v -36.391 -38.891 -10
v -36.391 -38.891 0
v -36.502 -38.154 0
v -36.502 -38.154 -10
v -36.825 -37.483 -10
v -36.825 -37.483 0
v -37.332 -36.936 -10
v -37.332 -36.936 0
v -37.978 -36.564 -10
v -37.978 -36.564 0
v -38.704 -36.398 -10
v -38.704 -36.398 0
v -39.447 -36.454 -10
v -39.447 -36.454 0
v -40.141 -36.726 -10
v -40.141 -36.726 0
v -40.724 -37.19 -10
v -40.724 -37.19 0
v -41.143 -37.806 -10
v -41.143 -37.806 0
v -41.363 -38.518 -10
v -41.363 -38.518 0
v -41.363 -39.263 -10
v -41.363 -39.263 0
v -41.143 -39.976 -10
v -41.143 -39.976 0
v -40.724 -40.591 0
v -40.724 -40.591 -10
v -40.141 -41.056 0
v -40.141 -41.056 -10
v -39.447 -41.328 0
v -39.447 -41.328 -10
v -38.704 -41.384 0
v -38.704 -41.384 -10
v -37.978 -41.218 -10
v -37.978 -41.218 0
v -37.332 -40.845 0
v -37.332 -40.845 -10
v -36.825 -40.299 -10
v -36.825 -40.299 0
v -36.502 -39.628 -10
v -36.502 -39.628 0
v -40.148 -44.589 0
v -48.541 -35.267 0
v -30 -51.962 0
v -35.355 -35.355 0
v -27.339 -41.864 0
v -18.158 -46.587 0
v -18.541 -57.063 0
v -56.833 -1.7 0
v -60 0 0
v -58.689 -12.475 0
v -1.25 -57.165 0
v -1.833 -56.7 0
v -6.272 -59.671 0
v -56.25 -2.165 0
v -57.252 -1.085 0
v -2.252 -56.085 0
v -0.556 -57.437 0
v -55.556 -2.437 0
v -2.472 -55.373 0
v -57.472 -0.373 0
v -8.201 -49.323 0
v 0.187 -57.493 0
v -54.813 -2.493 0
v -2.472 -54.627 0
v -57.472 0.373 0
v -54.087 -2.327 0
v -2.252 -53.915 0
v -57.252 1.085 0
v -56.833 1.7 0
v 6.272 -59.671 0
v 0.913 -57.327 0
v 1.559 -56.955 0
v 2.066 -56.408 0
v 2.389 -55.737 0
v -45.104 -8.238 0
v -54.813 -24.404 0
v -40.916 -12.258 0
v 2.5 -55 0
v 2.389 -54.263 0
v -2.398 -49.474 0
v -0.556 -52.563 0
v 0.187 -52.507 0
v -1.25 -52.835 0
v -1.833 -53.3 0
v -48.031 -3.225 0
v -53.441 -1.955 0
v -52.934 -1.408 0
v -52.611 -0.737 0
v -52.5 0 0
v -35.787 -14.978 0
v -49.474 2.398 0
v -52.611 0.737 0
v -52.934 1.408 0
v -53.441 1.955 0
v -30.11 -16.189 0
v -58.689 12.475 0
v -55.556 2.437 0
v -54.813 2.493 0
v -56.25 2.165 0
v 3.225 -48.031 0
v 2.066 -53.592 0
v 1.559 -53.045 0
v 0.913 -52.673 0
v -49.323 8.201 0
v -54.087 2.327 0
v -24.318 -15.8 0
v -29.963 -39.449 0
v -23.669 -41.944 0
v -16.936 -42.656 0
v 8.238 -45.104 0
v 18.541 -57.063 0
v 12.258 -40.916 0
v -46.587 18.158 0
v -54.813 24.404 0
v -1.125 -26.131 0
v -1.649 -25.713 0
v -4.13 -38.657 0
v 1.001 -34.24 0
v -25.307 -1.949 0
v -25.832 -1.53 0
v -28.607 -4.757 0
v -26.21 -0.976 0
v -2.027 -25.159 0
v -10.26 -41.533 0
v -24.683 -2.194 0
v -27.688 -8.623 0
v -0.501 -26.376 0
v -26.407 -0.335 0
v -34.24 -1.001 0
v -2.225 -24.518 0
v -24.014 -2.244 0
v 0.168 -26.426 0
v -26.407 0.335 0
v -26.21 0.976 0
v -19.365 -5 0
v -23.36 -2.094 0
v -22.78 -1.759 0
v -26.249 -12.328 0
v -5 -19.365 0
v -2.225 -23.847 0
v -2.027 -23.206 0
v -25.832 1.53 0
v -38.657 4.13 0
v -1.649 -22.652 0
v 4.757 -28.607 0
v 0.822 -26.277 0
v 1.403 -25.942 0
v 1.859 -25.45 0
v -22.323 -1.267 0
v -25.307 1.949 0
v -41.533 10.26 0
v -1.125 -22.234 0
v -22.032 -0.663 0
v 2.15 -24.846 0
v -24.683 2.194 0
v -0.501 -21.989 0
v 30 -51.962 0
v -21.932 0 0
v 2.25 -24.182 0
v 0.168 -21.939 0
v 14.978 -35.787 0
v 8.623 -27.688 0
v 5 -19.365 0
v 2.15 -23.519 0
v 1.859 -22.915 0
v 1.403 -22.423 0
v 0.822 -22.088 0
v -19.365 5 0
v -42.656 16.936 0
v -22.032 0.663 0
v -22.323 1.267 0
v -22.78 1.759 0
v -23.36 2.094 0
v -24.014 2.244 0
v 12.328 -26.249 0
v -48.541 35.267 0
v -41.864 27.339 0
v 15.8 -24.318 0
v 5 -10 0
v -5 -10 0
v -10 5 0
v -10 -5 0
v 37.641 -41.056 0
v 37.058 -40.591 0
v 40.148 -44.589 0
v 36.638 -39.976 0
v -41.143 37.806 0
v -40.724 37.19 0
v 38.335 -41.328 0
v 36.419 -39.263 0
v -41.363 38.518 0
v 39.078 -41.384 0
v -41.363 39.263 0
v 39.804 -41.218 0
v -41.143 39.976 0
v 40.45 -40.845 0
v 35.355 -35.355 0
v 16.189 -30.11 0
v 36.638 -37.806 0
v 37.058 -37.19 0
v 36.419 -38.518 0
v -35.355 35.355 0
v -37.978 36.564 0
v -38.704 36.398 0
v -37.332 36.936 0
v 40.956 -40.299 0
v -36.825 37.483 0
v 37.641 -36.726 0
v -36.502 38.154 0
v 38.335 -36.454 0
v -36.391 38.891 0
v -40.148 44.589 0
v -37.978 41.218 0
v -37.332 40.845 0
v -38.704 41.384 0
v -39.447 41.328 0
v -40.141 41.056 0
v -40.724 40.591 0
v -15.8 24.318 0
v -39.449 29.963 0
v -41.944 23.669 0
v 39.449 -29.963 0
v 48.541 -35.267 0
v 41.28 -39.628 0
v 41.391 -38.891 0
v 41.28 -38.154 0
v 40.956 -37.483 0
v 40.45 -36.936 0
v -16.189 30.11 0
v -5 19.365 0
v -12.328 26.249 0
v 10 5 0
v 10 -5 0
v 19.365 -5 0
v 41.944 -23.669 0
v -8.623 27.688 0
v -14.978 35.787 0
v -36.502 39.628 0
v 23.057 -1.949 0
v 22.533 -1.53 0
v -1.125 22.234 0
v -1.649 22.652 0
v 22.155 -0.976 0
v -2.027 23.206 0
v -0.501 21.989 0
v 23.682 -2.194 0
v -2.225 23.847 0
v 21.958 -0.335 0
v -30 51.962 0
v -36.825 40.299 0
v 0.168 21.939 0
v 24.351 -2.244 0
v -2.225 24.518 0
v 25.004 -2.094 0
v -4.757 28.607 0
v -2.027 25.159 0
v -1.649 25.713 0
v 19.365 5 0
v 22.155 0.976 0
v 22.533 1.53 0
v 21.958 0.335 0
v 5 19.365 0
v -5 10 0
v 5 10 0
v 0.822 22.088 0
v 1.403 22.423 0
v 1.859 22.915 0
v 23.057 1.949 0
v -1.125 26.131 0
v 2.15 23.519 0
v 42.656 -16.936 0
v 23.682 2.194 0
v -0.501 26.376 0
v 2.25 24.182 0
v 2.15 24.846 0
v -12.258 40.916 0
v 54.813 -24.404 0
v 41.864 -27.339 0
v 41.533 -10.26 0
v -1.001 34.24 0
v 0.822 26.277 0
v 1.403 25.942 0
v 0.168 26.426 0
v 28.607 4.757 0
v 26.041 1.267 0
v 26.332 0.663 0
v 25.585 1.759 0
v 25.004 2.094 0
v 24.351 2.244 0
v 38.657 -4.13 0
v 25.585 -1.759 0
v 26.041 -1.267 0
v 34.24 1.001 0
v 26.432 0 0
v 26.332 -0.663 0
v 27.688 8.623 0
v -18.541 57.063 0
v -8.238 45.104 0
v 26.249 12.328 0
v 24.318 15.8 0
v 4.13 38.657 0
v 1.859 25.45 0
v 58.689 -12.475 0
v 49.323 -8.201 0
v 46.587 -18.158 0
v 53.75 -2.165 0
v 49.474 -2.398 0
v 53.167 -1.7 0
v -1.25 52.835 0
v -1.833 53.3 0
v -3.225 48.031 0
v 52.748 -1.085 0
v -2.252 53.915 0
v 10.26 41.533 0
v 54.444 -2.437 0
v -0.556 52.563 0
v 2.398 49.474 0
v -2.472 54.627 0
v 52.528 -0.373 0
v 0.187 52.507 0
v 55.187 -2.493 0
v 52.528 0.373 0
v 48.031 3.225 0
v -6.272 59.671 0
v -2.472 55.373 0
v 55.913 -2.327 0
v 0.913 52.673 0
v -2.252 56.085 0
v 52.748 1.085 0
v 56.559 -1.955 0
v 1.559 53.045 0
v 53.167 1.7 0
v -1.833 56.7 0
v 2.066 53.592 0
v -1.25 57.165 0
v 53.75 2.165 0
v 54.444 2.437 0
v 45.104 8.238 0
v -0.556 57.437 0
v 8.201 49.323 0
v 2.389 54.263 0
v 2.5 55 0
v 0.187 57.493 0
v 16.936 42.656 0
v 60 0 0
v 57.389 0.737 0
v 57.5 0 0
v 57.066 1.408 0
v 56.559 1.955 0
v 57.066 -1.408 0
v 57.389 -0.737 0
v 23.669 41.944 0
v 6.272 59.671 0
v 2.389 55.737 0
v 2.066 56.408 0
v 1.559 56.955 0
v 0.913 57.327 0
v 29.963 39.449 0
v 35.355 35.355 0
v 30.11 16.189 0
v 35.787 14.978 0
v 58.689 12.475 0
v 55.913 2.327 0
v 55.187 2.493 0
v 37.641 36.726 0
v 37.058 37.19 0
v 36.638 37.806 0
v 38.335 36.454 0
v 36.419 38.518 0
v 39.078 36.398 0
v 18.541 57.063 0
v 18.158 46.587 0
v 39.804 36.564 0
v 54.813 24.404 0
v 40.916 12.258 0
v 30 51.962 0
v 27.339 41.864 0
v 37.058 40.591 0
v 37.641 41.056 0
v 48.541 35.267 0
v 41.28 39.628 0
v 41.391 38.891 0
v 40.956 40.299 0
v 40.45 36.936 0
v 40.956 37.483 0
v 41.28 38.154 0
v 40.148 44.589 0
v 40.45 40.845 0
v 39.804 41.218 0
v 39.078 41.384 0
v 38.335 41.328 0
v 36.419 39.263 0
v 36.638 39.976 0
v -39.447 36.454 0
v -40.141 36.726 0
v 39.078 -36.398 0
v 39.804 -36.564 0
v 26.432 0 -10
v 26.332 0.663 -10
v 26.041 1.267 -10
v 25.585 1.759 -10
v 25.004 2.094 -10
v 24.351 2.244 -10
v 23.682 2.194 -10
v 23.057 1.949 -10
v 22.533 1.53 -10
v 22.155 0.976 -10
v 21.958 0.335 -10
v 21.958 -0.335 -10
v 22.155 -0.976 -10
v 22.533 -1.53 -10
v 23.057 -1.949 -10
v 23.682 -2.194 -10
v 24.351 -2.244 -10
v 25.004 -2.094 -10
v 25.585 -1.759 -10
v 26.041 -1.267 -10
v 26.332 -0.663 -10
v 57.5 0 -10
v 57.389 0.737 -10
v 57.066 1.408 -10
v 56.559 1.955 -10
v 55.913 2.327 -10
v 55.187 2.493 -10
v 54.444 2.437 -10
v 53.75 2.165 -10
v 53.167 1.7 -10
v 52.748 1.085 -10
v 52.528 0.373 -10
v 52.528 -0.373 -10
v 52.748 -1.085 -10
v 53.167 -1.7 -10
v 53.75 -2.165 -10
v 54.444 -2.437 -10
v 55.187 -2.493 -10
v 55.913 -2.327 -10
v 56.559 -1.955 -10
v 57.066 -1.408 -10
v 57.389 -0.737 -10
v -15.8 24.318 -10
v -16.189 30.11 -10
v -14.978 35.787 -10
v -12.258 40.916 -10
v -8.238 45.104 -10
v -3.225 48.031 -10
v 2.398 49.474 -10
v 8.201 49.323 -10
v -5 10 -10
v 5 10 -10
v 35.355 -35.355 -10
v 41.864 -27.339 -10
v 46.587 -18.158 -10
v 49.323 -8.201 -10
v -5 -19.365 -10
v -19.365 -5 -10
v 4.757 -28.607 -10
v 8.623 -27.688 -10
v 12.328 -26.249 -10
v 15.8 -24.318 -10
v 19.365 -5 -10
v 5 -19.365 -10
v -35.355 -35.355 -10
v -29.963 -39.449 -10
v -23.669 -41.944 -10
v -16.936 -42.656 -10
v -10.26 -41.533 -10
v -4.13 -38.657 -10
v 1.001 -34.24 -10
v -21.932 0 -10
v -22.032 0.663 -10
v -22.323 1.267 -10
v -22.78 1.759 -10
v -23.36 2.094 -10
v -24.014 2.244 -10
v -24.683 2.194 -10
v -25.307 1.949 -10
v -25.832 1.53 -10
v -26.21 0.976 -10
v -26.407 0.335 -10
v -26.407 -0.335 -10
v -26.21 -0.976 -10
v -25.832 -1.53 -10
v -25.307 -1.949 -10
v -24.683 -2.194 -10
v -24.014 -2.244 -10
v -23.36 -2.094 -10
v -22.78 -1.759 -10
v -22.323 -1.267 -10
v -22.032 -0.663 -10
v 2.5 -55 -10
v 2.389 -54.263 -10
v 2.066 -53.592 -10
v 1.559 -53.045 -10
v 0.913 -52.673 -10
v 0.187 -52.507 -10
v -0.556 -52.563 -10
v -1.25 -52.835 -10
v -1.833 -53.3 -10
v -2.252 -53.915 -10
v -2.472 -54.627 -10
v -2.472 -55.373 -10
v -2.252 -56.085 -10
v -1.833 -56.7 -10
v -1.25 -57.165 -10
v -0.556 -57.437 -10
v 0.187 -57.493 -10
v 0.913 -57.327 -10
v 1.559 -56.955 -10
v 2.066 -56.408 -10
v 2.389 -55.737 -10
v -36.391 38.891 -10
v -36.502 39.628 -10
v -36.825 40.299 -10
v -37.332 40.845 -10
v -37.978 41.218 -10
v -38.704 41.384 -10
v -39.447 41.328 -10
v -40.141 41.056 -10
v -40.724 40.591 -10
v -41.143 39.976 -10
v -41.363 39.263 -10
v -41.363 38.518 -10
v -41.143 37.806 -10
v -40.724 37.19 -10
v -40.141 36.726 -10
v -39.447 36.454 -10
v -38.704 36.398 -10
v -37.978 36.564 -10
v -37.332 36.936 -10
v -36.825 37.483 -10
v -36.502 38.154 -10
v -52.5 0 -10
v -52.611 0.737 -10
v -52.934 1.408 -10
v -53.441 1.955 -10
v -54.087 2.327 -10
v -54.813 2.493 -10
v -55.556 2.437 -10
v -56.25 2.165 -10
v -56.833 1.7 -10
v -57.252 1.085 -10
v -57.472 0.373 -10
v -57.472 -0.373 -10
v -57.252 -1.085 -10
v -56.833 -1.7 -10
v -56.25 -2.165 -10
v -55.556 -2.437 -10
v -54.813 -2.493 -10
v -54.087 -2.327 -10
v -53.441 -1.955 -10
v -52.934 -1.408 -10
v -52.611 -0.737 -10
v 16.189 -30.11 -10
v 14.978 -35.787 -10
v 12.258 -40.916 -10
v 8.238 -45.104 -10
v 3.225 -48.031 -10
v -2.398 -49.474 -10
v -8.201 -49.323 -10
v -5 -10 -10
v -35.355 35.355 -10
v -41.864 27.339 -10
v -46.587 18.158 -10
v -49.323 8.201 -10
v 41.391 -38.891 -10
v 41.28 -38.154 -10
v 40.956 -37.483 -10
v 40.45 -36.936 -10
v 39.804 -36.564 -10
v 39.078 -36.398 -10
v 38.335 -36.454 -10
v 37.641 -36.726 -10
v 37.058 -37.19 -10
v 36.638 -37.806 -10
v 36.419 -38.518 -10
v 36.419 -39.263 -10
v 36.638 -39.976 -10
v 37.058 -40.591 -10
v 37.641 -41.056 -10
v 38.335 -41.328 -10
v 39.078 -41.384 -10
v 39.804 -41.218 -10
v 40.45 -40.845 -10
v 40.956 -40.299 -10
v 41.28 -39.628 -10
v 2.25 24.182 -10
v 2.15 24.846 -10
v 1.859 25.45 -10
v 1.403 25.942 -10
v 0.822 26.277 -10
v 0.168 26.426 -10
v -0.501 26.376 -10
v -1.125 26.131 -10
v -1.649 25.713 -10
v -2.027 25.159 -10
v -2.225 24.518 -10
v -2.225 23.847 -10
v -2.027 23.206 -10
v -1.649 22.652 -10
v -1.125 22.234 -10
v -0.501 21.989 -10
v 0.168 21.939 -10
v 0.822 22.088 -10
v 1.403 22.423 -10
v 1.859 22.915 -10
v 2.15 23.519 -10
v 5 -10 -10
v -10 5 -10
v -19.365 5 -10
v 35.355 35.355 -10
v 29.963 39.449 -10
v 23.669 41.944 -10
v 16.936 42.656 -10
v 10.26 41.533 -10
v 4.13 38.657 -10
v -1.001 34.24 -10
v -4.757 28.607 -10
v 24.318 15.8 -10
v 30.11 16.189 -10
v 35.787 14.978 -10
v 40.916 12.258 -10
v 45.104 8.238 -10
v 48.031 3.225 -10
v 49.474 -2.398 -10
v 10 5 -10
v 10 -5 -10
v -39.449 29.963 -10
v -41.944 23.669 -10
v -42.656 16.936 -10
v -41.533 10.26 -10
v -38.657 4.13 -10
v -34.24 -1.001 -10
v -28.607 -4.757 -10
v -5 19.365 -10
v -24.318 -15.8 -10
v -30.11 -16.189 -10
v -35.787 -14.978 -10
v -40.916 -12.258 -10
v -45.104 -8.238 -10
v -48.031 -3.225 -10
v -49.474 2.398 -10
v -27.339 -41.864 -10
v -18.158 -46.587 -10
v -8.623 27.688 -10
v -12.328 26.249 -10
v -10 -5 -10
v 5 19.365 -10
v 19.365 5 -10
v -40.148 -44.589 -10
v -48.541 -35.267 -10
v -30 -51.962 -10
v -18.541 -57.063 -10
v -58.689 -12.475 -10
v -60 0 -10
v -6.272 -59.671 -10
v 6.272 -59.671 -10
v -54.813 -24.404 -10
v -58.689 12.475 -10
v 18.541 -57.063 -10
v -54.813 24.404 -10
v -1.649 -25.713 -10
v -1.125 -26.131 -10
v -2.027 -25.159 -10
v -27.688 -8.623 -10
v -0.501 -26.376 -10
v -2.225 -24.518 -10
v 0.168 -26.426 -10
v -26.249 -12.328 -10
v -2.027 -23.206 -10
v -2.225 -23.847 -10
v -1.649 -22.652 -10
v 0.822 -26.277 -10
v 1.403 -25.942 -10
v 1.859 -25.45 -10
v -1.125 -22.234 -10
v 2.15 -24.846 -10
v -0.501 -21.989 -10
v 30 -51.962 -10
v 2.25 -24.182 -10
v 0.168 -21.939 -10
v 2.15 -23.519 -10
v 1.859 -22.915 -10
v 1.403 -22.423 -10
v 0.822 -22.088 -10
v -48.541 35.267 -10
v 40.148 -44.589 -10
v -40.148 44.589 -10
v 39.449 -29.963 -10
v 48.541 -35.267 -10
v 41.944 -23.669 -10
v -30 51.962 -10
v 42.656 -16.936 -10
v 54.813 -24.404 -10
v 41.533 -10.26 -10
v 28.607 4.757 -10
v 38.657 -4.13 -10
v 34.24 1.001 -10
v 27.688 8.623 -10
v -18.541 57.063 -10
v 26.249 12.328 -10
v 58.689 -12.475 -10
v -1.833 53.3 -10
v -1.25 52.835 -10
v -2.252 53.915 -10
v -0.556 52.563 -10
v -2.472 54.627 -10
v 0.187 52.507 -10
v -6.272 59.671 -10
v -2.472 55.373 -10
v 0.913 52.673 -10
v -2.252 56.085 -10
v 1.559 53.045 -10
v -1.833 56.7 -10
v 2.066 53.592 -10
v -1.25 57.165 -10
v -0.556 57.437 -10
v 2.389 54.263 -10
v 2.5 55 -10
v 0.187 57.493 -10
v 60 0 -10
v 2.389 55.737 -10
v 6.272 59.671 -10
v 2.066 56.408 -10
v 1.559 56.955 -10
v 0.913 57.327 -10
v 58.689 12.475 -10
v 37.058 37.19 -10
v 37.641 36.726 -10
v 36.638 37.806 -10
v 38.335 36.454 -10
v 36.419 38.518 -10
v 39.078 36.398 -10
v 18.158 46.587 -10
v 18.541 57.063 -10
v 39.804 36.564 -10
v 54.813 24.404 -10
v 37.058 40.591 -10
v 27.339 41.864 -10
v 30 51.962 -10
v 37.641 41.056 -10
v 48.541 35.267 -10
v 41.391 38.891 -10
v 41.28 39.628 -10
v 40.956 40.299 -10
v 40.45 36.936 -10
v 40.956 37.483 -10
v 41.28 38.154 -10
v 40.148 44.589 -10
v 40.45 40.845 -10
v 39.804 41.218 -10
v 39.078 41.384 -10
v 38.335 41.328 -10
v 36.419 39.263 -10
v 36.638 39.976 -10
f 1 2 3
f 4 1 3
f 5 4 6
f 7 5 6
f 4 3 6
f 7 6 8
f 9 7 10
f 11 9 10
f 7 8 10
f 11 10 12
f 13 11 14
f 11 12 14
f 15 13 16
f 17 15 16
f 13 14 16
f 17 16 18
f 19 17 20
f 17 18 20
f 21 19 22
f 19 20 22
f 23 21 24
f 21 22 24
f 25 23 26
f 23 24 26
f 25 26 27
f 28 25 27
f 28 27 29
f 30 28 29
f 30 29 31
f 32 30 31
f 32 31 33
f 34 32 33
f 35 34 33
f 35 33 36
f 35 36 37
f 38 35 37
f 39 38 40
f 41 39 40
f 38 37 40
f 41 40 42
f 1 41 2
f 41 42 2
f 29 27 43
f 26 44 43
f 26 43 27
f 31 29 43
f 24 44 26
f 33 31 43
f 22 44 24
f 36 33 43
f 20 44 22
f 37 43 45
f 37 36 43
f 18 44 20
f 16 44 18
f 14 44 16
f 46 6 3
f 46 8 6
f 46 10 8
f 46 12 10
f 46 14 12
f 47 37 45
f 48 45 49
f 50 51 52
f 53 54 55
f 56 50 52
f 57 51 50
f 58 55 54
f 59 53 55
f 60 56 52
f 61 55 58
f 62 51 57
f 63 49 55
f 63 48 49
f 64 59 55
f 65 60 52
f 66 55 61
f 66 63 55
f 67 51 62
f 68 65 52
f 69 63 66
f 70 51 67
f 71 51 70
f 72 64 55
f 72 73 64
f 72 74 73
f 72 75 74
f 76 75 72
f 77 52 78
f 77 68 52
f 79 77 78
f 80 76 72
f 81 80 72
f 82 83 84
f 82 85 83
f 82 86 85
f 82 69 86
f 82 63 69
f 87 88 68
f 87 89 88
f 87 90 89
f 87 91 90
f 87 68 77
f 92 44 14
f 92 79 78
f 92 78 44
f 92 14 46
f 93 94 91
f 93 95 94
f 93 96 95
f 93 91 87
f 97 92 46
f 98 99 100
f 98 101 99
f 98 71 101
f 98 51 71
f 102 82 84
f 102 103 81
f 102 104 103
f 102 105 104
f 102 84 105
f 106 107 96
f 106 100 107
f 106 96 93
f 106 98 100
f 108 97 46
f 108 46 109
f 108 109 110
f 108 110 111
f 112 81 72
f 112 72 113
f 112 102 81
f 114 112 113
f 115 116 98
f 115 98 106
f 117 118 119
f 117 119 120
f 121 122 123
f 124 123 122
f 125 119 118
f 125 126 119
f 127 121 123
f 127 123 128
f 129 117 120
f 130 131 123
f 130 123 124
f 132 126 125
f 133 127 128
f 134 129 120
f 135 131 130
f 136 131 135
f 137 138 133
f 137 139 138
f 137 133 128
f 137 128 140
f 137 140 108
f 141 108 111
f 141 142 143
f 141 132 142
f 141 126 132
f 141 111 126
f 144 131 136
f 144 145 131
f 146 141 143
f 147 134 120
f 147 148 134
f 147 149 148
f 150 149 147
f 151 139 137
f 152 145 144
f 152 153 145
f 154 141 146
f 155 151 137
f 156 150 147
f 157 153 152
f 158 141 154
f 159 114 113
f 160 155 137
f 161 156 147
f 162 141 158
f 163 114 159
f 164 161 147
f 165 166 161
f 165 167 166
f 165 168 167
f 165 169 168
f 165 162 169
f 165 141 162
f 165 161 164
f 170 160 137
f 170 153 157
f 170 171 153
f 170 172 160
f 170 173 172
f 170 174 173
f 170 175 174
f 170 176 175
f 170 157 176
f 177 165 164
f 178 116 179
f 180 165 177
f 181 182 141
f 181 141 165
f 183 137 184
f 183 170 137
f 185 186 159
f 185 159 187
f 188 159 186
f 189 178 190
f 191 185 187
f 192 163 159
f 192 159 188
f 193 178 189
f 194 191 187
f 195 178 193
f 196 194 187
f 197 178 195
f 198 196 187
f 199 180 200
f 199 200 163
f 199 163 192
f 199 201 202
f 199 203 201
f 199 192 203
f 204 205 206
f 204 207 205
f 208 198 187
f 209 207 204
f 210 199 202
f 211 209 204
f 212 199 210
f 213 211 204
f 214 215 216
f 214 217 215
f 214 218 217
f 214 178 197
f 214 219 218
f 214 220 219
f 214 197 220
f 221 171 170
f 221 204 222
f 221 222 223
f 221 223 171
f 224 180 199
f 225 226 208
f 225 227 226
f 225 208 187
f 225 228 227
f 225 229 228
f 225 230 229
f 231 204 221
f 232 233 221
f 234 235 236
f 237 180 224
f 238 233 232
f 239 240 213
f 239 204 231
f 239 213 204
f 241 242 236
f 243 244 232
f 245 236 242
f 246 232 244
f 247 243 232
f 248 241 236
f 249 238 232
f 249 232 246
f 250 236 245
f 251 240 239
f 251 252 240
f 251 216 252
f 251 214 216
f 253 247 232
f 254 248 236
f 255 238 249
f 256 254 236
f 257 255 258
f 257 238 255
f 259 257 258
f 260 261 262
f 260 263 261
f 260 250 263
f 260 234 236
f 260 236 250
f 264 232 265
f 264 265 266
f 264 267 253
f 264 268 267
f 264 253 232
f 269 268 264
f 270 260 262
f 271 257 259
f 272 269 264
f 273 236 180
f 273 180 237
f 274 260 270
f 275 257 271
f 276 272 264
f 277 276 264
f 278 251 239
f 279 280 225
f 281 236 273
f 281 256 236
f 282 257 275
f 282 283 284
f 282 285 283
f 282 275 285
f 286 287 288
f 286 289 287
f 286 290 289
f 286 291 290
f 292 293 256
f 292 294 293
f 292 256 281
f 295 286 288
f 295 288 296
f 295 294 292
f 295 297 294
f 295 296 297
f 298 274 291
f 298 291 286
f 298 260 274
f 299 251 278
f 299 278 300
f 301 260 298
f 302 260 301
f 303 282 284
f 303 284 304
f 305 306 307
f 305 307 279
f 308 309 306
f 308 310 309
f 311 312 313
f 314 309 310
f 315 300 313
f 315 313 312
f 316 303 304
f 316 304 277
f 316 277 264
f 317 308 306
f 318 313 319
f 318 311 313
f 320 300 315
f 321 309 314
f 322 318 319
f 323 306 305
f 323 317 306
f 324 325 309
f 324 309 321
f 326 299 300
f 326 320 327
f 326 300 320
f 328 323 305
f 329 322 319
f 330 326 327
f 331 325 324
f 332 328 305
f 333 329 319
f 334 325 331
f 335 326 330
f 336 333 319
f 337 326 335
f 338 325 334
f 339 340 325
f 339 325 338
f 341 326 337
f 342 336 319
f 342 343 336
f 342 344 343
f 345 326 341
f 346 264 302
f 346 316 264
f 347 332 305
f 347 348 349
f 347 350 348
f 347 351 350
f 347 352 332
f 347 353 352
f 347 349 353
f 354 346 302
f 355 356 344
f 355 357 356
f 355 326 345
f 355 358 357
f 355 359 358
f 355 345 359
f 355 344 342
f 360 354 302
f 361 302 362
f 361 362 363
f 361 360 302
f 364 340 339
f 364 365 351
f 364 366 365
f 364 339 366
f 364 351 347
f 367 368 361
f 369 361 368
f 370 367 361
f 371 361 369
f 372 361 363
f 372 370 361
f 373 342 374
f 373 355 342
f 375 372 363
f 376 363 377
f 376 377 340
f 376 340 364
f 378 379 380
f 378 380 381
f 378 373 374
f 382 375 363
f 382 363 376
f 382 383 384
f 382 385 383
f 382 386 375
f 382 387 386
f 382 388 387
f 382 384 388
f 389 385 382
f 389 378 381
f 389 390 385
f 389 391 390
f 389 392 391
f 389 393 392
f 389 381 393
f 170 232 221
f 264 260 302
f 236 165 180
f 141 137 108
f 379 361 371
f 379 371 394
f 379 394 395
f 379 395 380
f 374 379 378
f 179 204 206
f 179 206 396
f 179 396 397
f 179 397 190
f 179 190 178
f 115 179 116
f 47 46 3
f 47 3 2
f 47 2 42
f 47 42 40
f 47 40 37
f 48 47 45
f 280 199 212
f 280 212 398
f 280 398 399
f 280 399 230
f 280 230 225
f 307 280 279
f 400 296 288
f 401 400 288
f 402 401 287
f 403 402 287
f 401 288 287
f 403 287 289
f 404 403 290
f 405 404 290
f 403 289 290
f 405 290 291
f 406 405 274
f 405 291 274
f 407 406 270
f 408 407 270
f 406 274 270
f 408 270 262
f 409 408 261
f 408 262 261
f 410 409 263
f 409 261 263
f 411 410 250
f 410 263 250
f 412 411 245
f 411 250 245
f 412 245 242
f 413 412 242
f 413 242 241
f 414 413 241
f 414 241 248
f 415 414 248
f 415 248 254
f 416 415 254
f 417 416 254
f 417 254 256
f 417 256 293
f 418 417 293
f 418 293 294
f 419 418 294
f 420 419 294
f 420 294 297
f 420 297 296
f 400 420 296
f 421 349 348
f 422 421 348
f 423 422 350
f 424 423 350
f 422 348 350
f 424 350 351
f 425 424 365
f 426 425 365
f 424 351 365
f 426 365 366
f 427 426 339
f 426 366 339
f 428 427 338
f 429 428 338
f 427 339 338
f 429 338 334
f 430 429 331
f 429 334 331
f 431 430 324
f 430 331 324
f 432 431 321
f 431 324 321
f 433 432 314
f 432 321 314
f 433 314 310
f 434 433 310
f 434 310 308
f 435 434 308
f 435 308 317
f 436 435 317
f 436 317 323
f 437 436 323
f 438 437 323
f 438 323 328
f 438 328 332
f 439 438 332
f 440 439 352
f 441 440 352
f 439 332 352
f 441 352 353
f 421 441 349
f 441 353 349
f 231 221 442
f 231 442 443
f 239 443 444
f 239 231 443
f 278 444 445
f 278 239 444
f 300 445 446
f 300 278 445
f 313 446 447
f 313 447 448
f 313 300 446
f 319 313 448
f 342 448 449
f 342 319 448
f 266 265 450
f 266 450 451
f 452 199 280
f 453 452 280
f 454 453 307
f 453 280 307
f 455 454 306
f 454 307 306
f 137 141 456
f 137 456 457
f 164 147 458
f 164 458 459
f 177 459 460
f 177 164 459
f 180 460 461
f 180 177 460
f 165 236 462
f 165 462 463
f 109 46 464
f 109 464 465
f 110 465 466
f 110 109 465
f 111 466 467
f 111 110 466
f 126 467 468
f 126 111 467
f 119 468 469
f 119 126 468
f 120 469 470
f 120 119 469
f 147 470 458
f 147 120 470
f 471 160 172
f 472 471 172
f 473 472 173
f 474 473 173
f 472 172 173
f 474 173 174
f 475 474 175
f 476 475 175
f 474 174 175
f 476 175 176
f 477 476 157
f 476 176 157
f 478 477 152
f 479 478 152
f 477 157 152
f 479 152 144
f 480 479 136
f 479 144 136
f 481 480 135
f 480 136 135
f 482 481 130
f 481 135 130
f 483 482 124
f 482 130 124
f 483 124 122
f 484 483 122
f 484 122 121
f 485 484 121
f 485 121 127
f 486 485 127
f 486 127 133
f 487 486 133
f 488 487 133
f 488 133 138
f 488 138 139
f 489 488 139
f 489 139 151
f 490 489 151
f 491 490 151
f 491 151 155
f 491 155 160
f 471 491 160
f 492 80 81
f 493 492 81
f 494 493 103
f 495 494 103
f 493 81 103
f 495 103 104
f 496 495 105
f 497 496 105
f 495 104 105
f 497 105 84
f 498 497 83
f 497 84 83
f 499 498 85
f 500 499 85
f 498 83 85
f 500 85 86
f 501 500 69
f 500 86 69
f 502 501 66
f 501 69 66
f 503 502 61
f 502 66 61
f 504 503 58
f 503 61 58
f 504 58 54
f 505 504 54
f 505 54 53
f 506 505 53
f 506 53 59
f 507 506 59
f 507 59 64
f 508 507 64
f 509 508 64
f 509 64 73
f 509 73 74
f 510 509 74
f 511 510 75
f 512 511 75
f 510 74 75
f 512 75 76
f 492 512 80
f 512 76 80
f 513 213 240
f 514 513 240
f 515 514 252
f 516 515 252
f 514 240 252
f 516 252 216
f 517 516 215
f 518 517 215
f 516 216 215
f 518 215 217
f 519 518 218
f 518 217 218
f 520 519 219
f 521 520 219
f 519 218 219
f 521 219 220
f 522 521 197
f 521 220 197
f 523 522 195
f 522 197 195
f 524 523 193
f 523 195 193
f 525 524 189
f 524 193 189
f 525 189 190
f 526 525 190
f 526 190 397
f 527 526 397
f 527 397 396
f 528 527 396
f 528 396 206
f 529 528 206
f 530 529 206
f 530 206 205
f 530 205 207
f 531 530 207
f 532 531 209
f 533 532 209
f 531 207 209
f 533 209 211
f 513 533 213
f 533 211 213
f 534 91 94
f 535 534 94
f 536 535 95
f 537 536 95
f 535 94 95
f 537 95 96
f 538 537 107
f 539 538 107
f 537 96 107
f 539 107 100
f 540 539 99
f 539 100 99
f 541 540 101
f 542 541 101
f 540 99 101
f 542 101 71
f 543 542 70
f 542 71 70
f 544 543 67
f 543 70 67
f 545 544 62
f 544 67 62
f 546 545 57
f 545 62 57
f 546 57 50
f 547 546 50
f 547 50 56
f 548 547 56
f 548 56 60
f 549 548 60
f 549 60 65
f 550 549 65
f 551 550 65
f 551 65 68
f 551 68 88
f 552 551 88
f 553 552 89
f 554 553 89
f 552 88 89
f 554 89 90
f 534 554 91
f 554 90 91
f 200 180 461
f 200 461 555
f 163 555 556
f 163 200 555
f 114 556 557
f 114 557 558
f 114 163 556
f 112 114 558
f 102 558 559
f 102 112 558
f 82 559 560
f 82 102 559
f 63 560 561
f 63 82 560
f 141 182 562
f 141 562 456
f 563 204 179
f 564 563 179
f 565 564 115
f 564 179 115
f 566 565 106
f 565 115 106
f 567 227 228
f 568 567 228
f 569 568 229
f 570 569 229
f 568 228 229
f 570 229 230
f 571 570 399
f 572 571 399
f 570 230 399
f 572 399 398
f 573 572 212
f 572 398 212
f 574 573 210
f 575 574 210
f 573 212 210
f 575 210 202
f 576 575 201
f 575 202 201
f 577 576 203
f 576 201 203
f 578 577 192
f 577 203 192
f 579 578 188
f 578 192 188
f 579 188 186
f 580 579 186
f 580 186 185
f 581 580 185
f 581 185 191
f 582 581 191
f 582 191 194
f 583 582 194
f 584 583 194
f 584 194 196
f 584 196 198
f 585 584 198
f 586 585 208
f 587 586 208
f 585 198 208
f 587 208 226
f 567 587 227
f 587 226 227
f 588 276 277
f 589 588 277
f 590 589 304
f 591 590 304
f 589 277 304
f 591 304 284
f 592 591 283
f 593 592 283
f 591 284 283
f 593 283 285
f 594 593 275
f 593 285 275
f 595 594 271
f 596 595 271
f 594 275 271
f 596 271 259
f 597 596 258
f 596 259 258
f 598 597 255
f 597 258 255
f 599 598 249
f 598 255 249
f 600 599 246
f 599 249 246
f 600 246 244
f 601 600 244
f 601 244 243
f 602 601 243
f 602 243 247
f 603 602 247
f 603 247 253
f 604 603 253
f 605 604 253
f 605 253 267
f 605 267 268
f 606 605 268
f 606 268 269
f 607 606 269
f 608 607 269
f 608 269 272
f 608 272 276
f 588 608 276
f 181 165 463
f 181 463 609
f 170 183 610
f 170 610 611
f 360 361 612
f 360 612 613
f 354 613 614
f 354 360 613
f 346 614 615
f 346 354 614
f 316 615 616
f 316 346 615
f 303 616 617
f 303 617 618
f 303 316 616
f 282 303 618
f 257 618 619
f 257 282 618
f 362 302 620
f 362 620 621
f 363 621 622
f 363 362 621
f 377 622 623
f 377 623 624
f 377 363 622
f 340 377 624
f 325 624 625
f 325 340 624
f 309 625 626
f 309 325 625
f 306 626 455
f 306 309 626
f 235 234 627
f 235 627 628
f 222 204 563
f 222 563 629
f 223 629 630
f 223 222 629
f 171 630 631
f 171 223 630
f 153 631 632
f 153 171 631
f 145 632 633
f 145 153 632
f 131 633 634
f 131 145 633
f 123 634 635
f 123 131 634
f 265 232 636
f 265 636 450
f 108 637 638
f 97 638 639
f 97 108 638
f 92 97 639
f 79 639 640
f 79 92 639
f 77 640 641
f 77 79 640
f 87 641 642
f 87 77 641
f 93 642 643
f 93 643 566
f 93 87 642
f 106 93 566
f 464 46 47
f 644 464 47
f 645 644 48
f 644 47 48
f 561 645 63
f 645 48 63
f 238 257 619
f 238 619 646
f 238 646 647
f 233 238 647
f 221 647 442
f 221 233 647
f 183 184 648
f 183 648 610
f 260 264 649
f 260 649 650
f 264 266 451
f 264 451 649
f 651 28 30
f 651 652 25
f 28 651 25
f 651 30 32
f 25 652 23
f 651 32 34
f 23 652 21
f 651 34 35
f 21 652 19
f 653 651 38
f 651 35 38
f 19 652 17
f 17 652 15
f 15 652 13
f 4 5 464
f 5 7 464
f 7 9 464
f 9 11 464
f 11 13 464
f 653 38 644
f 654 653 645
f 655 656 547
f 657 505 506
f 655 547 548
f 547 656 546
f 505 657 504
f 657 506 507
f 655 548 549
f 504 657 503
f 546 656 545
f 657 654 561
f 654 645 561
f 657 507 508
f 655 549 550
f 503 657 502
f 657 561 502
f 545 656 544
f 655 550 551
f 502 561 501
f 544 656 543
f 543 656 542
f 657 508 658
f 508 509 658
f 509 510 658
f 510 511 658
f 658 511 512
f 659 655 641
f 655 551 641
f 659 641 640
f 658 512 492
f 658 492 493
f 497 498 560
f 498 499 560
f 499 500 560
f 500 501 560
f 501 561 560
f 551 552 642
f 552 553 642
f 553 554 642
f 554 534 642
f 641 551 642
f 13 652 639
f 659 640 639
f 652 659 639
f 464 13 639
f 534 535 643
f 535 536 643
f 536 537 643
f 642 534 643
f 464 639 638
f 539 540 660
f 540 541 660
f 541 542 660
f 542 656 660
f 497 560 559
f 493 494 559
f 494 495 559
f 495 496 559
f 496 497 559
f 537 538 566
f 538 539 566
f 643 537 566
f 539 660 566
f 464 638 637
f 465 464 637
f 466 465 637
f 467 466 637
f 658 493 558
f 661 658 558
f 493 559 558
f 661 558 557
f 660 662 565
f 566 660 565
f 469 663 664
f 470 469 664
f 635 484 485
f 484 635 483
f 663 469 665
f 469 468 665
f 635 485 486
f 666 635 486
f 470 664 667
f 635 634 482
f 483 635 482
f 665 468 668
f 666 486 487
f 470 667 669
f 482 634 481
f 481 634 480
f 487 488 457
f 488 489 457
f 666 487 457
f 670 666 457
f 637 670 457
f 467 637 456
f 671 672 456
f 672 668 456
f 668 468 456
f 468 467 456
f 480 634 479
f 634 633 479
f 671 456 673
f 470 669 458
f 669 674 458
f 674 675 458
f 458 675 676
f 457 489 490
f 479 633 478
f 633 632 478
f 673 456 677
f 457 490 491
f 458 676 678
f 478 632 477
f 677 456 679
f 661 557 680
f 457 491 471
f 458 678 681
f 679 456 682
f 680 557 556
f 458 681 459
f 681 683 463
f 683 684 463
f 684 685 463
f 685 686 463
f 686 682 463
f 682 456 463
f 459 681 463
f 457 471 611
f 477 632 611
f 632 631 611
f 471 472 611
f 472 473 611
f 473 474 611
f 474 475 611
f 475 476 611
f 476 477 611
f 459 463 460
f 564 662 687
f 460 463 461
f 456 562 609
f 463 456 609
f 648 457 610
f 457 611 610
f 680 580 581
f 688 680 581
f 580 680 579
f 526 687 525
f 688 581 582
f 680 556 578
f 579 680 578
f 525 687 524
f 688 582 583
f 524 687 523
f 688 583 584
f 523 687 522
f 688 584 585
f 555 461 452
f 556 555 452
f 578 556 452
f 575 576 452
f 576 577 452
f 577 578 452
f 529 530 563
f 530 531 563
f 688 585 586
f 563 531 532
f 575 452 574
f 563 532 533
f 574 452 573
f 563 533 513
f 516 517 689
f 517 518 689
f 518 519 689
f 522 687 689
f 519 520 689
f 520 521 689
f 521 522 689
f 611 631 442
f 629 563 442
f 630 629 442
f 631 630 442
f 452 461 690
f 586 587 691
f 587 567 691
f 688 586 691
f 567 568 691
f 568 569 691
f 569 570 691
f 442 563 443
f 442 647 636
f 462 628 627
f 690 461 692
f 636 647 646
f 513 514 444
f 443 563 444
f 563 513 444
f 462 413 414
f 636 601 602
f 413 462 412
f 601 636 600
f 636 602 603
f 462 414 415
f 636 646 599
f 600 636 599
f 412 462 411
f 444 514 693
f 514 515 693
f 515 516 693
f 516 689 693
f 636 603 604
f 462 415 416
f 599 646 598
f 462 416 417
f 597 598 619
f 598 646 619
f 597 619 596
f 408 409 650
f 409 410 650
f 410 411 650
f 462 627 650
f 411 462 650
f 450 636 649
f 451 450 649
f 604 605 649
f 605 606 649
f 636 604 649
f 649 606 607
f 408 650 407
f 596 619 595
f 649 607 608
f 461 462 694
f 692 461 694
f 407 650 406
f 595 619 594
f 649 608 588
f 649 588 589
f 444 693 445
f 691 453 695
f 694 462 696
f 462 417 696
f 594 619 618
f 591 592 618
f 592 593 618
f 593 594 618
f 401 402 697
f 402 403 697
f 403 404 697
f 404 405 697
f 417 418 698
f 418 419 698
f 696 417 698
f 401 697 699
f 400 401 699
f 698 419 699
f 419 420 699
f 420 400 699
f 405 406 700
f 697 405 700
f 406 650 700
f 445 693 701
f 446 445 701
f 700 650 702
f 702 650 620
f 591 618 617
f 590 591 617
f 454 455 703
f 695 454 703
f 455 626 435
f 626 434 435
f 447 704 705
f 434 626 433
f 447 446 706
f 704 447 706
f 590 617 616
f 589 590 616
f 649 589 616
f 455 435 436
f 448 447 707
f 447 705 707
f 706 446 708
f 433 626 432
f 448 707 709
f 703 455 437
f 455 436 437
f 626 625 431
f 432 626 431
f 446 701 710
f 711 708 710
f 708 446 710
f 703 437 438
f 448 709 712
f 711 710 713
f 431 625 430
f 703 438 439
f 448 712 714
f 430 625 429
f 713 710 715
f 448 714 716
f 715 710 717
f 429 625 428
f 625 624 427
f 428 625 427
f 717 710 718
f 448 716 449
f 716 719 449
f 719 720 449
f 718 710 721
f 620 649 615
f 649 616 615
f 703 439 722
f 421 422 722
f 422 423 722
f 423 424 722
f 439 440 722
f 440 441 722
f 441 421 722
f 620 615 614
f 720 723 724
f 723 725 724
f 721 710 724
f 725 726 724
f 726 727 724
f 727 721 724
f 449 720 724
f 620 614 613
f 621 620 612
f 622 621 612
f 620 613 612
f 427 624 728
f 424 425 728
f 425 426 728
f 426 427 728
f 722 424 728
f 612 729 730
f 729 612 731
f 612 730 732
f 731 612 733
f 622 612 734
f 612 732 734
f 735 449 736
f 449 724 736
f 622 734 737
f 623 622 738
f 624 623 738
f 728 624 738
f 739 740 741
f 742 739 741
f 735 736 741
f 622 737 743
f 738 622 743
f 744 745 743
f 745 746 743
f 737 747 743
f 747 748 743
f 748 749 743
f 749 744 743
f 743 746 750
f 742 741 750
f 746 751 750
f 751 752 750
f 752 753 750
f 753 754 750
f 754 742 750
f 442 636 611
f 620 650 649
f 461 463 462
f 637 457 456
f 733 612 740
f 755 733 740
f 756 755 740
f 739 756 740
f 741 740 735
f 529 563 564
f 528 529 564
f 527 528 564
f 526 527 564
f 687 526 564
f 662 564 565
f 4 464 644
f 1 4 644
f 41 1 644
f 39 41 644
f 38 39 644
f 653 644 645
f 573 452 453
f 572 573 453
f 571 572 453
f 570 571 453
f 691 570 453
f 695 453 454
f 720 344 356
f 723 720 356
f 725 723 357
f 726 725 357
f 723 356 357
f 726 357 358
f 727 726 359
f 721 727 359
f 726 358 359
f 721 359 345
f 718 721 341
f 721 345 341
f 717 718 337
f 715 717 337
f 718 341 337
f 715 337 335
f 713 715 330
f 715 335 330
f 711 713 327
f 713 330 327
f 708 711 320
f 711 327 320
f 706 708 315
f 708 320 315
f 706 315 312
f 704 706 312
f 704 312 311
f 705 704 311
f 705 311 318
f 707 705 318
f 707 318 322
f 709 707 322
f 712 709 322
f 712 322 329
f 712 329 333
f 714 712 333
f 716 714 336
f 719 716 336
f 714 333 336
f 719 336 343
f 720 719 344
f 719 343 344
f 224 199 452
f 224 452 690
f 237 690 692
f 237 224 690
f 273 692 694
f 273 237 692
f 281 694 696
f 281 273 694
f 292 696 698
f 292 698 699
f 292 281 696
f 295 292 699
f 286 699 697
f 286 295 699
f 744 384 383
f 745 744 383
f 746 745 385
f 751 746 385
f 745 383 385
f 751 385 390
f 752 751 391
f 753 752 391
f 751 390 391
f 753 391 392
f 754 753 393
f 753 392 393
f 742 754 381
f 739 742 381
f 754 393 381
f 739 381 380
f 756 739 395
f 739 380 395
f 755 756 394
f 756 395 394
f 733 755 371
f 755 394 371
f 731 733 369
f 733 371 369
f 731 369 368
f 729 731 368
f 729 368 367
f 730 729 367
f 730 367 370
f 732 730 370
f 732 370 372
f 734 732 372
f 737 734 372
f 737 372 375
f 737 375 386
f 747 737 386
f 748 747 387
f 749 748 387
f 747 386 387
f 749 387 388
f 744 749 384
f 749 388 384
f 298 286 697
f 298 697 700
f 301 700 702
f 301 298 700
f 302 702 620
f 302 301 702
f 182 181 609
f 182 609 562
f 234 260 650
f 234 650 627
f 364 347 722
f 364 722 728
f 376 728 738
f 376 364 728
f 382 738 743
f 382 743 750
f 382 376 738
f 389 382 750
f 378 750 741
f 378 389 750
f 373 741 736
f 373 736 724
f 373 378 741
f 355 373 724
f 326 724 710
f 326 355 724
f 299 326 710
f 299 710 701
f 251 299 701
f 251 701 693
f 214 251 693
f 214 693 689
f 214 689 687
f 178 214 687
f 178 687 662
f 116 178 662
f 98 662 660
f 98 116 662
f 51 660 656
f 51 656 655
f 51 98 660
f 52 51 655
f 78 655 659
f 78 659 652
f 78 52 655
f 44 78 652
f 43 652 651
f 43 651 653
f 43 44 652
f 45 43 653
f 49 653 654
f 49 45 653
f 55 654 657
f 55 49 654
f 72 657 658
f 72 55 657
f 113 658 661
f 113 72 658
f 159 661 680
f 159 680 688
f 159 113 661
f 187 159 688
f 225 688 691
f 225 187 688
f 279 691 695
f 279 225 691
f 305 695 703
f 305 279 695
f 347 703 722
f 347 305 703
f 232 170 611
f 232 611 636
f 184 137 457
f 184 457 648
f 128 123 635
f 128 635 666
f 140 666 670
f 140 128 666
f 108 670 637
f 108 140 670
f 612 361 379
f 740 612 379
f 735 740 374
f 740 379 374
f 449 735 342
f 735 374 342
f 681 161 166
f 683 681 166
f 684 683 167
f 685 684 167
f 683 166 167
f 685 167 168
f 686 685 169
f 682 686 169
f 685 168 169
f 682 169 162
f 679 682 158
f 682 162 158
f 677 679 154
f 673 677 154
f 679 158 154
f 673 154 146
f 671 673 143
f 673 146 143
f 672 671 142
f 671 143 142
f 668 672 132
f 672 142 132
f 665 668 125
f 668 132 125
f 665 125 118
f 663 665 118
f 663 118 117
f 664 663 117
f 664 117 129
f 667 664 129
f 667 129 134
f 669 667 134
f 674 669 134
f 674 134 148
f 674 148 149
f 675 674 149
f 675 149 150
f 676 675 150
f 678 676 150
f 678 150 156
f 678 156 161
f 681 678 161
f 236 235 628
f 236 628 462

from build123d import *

# Parameters (mm, degrees)
SKETCH6_R                        = 29
SKETCH6_R_2                      = 20
INNER_RING_DEPTH                 = 10
MOTOR_CONNECTOR_CUT_DEPTH        = 10
SKETCH8_R                        = 2.25
MOTOR_CONNECTOR_HOLES_DEPTH      = 1
MOTOR_CONNECTOR_HOLES_DEPTH_BACK = 18
MIDDLE_PATTERN_DEPTH             = 10
SKETCH9_R                        = 60
SKETCH9_R_2                      = 50
SKETCH9_R_3                      = 2.5
BOSS_EXTRUDE1_DEPTH              = 10
BOSS_EXTRUDE2_DEPTH              = 10


with BuildPart() as part:
    # Sketch6 → Inner Ring (new body)
    with BuildSketch(Plane.XY):
        Circle(SKETCH6_R)
        Circle(SKETCH6_R_2, mode=Mode.SUBTRACT)
    extrude(amount=-INNER_RING_DEPTH)

    # Sketch7 → Motor Connector Cut (add)
    with BuildSketch(Plane.XY):
        with BuildLine():
            ThreePointArc((20, 0), (19.840593925, 2.52008585), (19.364916731, 5))
            Line((19.364916731, 5), (9.999996731, 5))
            Line((9.999996731, 5), (9.999996731, -5))
            Line((9.999996731, -5), (19.364916731, -5))
            ThreePointArc((19.364916731, -5), (19.840593925, -2.52008585), (20, 0))
        make_face()
        with BuildLine():
            ThreePointArc((5, 19.364916731), (0, 20), (-5, 19.364916731))
            Line((-5, 19.364916731), (-5, 9.999996731))
            Line((-5, 9.999996731), (5, 9.999996731))
            Line((5, 9.999996731), (5, 19.364916731))
        make_face()
        with BuildLine():
            Line((-9.999996731, -5), (-9.999996731, 5))
            Line((-9.999996731, 5), (-19.364916731, 5))
            ThreePointArc((-19.364916731, 5), (-20, 0), (-19.364916731, -5))
            Line((-19.364916731, -5), (-9.999996731, -5))
        make_face()
        with BuildLine():
            Line((-5, -9.999996731), (-5, -19.364916731))
            ThreePointArc((-5, -19.364916731), (0, -20), (5, -19.364916731))
            Line((5, -19.364916731), (5, -9.999996731))
            Line((5, -9.999996731), (-5, -9.999996731))
        make_face()
    extrude(amount=-MOTOR_CONNECTOR_CUT_DEPTH)

    # Sketch8 → Motor Connector Holes (cut, two sides)
    with BuildSketch(Plane.XY) as motor_connector_holes_sk:
        with Locations((0, 24.182458366)):
            Circle(SKETCH8_R)
        with Locations((24.182458366, 0)):
            Circle(SKETCH8_R)
        with Locations((0, -24.182458366)):
            Circle(SKETCH8_R)
        with Locations((-24.182458366, 0)):
            Circle(SKETCH8_R)
    extrude(amount=MOTOR_CONNECTOR_HOLES_DEPTH, mode=Mode.SUBTRACT)
    extrude(motor_connector_holes_sk.sketch, amount=-MOTOR_CONNECTOR_HOLES_DEPTH_BACK, mode=Mode.SUBTRACT)

    # Sketch10 → Middle Pattern (add)
    with BuildSketch(Plane.XY):
        with BuildLine():
            ThreePointArc((28.607215414, 4.756808408), (26.539406056, -11.690163651), (15.800414568, -24.317625284))
            ThreePointArc((15.800414568, -24.317625284), (10.393277118, -43.149392299), (-8.201394307, -49.322785114))
            ThreePointArc((-8.201394307, -49.322785114), (15.267827816, -47.611904328), (35.355339059, -35.355339059))
            ThreePointArc((35.355339059, -35.355339059), (42.321804958, -13.559663633), (28.607215414, 4.756808408))
        make_face()
        with BuildLine():
            ThreePointArc((24.317625284, 15.800414568), (43.149392359, 10.39327706), (49.322785087, -8.201394473))
            ThreePointArc((49.322785087, -8.201394473), (47.611904354, 15.267827736), (35.355339059, 35.355339059))
            ThreePointArc((35.355339059, 35.355339059), (13.559663633, 42.321804958), (-4.756808408, 28.607215414))
            ThreePointArc((-4.756808408, 28.607215414), (11.690163651, 26.539406056), (24.317625284, 15.800414568))
        make_face()
        with BuildLine():
            ThreePointArc((8.201394106, 49.322785148), (-15.267827902, 47.611904301), (-35.355339044, 35.355339075))
            ThreePointArc((-35.355339044, 35.355339075), (-42.32180496, 13.559663644), (-28.607215414, -4.756808408))
            ThreePointArc((-28.607215414, -4.756808408), (-26.539406056, 11.690163651), (-15.800414568, 24.317625284))
            ThreePointArc((-15.800414568, 24.317625284), (-10.393277189, 43.149392225), (8.201394106, 49.322785148))
        make_face()
        with BuildLine():
            ThreePointArc((4.756808408, -28.607215414), (-11.690163651, -26.539406056), (-24.317625284, -15.800414568))
            ThreePointArc((-24.317625284, -15.800414568), (-43.149392012, -10.393277393), (-49.322785244, 8.201393524))
            ThreePointArc((-49.322785244, 8.201393524), (-47.61190416, -15.267828343), (-35.355338839, -35.35533928))
            ThreePointArc((-35.355338839, -35.35533928), (-13.559663479, -42.321804932), (4.756808408, -28.607215414))
        make_face()
    extrude(amount=-MIDDLE_PATTERN_DEPTH)

    # Sketch9 → Boss-Extrude1 (add)
    with BuildSketch(Plane.XY):
        Circle(SKETCH9_R)
        Circle(SKETCH9_R_2, mode=Mode.SUBTRACT)
        with Locations((0, 55)):
            Circle(SKETCH9_R_3, mode=Mode.SUBTRACT)
        with Locations((-38.890872965, 38.890872965)):
            Circle(SKETCH9_R_3, mode=Mode.SUBTRACT)
        with Locations((-55, 0)):
            Circle(SKETCH9_R_3, mode=Mode.SUBTRACT)
        with Locations((-38.890872965, -38.890872965)):
            Circle(SKETCH9_R_3, mode=Mode.SUBTRACT)
        with Locations((0, -55)):
            Circle(SKETCH9_R_3, mode=Mode.SUBTRACT)
        with Locations((38.890872965, -38.890872965)):
            Circle(SKETCH9_R_3, mode=Mode.SUBTRACT)
        with Locations((55, 0)):
            Circle(SKETCH9_R_3, mode=Mode.SUBTRACT)
        with Locations((38.890872965, 38.890872965)):
            Circle(SKETCH9_R_3, mode=Mode.SUBTRACT)
    extrude(amount=-BOSS_EXTRUDE1_DEPTH)

    # Sketch11 → Boss-Extrude2 (add)
    with BuildSketch(Plane.XY):
        with BuildLine():
            Line((-19.364916731, 5), (-5, 19.364916731))
            ThreePointArc((-5, 19.364916731), (-14.142135624, 14.142135624), (-19.364916731, 5))
        make_face()
        with BuildLine():
            Line((5, 19.364916731), (19.364916731, 5))
            ThreePointArc((19.364916731, 5), (14.142135624, 14.142135624), (5, 19.364916731))
        make_face()
        with BuildLine():
            Line((19.364916731, -5), (5, -19.364916731))
            ThreePointArc((5, -19.364916731), (14.142135624, -14.142135624), (19.364916731, -5))
        make_face()
        with BuildLine():
            Line((-5, -19.364916731), (-19.364916731, -5))
            ThreePointArc((-19.364916731, -5), (-14.142135624, -14.142135624), (-5, -19.364916731))
        make_face()
    extrude(amount=-BOSS_EXTRUDE2_DEPTH)


solid = part.part
